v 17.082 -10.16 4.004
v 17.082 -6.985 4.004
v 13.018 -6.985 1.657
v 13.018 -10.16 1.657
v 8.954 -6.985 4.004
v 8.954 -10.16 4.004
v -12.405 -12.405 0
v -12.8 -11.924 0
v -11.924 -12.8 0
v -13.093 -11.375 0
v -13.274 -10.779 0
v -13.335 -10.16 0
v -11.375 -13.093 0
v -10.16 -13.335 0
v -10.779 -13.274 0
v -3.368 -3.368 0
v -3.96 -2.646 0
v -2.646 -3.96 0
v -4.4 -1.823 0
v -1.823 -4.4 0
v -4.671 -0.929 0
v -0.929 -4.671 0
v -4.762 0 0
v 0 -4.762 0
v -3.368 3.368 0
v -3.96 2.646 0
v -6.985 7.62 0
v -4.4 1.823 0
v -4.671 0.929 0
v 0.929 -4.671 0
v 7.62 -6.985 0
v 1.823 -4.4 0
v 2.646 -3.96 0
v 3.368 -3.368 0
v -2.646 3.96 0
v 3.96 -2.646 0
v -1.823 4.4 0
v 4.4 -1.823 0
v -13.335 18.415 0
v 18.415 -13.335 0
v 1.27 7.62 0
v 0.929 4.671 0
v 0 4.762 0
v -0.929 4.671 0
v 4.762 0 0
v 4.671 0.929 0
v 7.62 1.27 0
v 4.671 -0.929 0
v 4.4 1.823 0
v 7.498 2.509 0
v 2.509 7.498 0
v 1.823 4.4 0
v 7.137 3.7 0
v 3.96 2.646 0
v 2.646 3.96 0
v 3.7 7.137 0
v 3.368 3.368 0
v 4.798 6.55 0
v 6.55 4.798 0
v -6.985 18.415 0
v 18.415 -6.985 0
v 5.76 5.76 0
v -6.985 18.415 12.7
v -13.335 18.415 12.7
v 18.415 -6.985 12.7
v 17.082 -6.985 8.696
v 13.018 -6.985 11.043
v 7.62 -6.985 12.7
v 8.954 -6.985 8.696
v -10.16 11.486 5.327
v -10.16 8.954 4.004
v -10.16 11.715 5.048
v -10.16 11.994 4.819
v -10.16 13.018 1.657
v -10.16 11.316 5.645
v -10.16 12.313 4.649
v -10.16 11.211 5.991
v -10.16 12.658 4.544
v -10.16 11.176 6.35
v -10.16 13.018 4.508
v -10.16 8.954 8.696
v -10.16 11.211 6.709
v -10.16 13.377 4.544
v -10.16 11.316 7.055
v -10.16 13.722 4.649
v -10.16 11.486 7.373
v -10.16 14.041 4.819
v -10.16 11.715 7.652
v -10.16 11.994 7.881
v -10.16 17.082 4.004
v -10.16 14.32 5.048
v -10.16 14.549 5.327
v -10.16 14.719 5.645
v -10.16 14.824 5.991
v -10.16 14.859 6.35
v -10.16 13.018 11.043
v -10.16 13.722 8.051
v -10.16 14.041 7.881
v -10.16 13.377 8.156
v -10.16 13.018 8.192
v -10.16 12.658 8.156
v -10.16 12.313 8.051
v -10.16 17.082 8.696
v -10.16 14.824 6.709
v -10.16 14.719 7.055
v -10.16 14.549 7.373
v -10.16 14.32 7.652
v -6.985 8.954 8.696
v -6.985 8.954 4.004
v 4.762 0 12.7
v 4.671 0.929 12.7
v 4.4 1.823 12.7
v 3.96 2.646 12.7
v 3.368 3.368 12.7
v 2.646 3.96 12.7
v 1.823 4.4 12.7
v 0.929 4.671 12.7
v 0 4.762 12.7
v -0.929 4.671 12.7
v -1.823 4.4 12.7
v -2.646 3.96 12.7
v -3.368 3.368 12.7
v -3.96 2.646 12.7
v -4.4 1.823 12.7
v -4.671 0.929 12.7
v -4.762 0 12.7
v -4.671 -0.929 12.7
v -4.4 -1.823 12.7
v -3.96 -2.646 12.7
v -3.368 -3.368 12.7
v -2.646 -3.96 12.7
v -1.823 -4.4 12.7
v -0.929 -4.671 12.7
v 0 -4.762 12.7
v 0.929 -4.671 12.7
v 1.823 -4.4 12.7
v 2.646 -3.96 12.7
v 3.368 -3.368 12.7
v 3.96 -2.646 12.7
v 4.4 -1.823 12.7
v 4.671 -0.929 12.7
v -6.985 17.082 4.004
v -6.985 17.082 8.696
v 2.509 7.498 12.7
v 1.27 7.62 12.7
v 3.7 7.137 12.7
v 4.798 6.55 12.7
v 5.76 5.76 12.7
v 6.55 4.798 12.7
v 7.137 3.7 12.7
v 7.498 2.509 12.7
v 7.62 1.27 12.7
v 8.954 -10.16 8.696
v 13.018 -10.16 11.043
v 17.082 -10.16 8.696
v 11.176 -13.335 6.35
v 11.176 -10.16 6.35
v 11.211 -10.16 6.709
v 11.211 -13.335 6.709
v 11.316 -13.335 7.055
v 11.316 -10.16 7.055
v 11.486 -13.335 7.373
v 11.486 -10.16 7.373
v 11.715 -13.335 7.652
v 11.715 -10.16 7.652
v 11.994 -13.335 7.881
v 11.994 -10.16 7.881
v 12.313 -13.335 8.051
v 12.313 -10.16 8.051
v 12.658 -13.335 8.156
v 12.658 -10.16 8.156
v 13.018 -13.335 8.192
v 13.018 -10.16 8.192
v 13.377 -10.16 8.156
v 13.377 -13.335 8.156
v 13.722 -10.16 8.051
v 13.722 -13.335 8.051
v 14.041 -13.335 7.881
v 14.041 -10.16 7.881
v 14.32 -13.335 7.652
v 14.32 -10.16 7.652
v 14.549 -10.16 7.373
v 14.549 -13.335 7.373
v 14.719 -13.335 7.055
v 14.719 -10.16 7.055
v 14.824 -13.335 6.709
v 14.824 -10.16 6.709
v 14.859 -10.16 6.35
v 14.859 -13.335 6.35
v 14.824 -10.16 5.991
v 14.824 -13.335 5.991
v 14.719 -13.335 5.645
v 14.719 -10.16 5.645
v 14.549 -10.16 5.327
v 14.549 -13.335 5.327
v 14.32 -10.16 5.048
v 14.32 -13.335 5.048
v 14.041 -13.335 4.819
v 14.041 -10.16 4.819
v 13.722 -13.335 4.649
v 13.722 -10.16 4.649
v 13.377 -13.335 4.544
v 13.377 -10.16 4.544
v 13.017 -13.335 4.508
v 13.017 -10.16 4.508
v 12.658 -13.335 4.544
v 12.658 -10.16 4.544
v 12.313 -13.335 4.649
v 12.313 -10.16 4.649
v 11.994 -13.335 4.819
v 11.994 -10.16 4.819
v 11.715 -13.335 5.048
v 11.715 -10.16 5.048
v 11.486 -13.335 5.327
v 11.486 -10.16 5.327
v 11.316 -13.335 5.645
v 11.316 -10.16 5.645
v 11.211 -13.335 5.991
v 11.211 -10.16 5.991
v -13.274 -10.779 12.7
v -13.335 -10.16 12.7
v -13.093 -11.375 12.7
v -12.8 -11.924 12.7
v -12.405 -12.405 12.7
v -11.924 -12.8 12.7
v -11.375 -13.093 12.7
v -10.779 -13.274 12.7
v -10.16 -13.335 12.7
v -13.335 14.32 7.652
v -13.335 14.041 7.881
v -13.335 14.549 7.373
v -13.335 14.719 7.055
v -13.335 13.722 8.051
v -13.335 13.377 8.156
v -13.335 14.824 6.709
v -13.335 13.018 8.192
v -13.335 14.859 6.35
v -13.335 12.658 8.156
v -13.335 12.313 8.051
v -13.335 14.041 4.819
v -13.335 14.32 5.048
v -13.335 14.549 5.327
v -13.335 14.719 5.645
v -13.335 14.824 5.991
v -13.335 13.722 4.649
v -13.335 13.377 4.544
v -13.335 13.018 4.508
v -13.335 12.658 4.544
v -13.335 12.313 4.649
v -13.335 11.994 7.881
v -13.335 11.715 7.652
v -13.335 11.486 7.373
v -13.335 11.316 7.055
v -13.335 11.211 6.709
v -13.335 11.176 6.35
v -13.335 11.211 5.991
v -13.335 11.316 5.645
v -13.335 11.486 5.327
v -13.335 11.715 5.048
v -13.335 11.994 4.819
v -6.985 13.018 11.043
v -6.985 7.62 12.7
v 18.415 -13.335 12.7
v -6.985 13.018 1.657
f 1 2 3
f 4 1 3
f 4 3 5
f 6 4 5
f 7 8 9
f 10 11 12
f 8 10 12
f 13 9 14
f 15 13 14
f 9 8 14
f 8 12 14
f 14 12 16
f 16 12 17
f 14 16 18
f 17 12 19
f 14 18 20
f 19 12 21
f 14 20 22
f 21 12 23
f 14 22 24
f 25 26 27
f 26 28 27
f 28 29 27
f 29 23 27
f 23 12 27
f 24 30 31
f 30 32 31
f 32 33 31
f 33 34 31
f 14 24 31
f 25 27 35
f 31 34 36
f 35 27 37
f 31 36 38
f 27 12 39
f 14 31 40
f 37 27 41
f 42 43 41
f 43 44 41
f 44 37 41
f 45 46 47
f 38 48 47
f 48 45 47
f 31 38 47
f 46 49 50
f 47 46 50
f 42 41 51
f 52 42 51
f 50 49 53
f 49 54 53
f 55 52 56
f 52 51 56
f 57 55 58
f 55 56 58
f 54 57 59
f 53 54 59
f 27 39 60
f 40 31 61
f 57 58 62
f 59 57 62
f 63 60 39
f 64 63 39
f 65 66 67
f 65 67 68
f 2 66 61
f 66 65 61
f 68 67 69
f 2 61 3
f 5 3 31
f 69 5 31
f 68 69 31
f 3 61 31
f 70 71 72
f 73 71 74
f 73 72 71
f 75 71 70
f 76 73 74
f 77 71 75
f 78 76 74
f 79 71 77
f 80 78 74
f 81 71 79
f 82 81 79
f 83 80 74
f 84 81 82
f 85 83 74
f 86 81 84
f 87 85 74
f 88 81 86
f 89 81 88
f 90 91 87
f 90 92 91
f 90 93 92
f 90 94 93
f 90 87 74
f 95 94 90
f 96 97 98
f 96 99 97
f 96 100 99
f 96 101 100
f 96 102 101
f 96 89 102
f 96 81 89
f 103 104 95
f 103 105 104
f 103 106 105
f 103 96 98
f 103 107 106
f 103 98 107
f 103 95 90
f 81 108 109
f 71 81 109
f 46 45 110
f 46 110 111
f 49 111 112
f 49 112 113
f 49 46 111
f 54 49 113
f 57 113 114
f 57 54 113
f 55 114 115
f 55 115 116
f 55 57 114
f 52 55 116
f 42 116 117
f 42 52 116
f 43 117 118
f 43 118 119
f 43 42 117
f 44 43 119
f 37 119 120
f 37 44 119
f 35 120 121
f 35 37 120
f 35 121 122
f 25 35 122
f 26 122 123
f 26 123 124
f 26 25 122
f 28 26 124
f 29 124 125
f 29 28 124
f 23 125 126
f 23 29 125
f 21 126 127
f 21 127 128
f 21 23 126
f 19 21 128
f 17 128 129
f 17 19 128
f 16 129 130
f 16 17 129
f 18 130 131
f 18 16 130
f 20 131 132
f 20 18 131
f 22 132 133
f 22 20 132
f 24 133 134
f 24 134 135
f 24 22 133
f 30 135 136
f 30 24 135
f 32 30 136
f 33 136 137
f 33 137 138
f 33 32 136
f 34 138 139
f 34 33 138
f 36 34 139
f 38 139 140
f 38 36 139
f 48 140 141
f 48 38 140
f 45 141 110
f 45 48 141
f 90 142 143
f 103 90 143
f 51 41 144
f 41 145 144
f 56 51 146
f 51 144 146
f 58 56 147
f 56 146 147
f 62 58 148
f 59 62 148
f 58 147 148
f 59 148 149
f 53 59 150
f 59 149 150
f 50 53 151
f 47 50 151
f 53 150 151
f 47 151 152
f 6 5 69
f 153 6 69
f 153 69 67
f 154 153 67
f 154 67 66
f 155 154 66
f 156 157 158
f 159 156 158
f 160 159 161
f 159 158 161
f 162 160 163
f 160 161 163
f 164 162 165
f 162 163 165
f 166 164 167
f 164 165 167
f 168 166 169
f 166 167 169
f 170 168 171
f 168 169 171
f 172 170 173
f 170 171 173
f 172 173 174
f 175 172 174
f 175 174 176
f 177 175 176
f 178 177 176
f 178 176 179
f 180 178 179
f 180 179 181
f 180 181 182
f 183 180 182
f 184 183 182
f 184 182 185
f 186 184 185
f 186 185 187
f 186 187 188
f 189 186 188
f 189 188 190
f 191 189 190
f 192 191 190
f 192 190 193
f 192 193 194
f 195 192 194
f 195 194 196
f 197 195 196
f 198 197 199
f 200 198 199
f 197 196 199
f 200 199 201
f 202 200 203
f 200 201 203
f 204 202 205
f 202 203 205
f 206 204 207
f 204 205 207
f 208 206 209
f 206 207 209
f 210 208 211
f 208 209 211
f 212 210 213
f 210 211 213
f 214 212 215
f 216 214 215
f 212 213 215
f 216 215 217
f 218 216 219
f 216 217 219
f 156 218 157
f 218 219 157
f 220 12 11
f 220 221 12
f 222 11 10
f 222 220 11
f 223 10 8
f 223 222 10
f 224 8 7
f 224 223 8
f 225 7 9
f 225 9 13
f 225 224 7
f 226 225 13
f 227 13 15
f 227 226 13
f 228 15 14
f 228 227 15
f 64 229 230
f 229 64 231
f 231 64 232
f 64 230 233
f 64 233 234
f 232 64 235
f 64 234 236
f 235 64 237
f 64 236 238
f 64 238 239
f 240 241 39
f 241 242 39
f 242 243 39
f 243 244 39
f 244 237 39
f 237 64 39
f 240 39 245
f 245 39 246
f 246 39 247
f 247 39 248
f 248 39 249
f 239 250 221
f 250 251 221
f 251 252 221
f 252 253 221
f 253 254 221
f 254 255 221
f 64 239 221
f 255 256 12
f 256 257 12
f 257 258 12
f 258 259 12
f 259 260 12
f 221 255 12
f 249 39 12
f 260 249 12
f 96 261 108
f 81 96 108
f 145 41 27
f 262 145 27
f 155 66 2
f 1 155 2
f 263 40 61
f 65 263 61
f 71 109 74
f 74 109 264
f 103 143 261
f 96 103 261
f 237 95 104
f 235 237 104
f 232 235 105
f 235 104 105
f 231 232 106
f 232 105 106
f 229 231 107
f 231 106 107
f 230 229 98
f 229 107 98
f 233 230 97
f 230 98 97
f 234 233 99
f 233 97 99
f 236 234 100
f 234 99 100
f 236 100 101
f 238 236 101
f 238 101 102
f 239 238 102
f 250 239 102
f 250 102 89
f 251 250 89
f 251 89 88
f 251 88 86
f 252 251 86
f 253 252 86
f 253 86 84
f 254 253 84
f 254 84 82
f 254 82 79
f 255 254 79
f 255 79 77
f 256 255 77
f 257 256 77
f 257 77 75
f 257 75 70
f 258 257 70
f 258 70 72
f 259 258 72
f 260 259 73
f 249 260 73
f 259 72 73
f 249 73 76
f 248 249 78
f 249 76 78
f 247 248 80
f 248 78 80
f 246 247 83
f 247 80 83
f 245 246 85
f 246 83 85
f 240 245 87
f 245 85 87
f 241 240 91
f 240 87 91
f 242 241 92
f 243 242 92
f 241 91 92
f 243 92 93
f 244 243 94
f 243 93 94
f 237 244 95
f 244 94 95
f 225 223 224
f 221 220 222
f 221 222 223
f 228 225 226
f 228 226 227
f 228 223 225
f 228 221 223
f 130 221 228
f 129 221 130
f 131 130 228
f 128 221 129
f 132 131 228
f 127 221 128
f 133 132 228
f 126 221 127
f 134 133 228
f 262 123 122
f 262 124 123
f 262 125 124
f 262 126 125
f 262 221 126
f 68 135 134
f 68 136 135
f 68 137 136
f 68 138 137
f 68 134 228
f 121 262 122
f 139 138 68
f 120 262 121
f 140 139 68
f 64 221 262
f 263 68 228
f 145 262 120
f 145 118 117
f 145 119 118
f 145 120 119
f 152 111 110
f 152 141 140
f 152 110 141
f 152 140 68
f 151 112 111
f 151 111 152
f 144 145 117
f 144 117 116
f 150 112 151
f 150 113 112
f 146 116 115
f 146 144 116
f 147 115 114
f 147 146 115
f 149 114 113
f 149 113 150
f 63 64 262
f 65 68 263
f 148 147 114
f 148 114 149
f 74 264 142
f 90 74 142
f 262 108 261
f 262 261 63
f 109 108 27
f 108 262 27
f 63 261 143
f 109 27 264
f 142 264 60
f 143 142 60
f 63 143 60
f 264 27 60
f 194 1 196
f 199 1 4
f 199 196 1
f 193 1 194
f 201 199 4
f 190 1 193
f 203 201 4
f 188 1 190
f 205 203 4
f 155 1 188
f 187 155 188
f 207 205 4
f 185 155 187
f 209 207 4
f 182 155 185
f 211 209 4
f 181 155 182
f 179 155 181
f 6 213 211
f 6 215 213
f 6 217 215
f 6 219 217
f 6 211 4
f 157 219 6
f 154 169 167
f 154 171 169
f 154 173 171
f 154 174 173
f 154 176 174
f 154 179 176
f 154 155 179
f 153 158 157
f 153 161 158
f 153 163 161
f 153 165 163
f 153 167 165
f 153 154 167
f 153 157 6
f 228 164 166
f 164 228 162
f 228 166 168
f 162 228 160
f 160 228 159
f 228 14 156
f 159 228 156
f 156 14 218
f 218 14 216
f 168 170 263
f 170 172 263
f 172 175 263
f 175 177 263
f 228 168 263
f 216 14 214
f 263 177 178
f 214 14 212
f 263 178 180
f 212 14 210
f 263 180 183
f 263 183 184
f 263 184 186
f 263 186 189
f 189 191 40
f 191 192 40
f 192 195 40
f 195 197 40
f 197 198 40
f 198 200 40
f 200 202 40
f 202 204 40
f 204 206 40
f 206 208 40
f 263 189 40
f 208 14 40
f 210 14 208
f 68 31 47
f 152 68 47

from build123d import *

# Parameters (mm, degrees)
F0_R      = 4.7625
F1_DEPTH  = 12.7
F2_R      = 6.35
F3_R      = 3.175
F4_R      = 1.8415
F5_DEPTH  = 25.4
F7_DEPTH  = 3.175
F8_R      = 1.8415
F9_DEPTH  = 25.4
F11_DEPTH = 3.175


with BuildPart() as f1:
    # F0 (on Top) → F1 (new body)
    with BuildSketch(Plane.XY):
        Polygon((-13.335, 18.415), (-13.335, -13.335), (18.415, -13.335), (18.415, -6.985), (7.62, -6.985), (7.62, 7.62), (-6.985, 7.62), (-6.985, 18.415), align=None)
        Circle(F0_R, mode=Mode.SUBTRACT)
    extrude(amount=F1_DEPTH)

    # F2
    f2_edges = [f1.edges().sort_by_distance(p)[0] for p in [
        (7.62, 7.62, 6.35),
    ]]
    fillet(f2_edges, radius=F2_R)

    # F3
    f3_edges = [f1.edges().sort_by_distance(p)[0] for p in [
        (-13.335, -13.335, 6.35),
    ]]
    fillet(f3_edges, radius=F3_R)

    # F4 (on face) → F5 (cut)
    with BuildSketch(Plane(origin=(0, -6.985, 0), x_dir=(-1, 0, 0), z_dir=(0, 1, 0))):
        with Locations((-13.0175, 6.35)):
            Circle(F4_R)
    extrude(amount=-F5_DEPTH, mode=Mode.SUBTRACT)

    # F6 (on face) → F7 (cut)
    with BuildSketch(Plane(origin=(0, -6.985, 0), x_dir=(-1, 0, 0), z_dir=(0, 1, 0))):
        Polygon((-17.0815, 4.003649), (-13.0175, 1.657297), (-8.9535, 4.003649), (-8.9535, 8.696351), (-13.0175, 11.042703), (-17.0815, 8.696351), align=None)
    extrude(amount=-F7_DEPTH, mode=Mode.SUBTRACT)

    # F8 (on face) → F9 (cut)
    with BuildSketch(Plane.YZ.offset(-6.985)):
        with Locations((13.0175, 6.35)):
            Circle(F8_R)
    extrude(amount=-F9_DEPTH, mode=Mode.SUBTRACT)

    # F10 (on face) → F11 (cut)
    with BuildSketch(Plane.YZ.offset(-6.985)):
        Polygon((8.9535, 8.696351), (8.9535, 4.003649), (13.0175, 1.657297), (17.0815, 4.003649), (17.0815, 8.696351), (13.0175, 11.042703), align=None)
    extrude(amount=-F11_DEPTH, mode=Mode.SUBTRACT)


solid = f1.part
